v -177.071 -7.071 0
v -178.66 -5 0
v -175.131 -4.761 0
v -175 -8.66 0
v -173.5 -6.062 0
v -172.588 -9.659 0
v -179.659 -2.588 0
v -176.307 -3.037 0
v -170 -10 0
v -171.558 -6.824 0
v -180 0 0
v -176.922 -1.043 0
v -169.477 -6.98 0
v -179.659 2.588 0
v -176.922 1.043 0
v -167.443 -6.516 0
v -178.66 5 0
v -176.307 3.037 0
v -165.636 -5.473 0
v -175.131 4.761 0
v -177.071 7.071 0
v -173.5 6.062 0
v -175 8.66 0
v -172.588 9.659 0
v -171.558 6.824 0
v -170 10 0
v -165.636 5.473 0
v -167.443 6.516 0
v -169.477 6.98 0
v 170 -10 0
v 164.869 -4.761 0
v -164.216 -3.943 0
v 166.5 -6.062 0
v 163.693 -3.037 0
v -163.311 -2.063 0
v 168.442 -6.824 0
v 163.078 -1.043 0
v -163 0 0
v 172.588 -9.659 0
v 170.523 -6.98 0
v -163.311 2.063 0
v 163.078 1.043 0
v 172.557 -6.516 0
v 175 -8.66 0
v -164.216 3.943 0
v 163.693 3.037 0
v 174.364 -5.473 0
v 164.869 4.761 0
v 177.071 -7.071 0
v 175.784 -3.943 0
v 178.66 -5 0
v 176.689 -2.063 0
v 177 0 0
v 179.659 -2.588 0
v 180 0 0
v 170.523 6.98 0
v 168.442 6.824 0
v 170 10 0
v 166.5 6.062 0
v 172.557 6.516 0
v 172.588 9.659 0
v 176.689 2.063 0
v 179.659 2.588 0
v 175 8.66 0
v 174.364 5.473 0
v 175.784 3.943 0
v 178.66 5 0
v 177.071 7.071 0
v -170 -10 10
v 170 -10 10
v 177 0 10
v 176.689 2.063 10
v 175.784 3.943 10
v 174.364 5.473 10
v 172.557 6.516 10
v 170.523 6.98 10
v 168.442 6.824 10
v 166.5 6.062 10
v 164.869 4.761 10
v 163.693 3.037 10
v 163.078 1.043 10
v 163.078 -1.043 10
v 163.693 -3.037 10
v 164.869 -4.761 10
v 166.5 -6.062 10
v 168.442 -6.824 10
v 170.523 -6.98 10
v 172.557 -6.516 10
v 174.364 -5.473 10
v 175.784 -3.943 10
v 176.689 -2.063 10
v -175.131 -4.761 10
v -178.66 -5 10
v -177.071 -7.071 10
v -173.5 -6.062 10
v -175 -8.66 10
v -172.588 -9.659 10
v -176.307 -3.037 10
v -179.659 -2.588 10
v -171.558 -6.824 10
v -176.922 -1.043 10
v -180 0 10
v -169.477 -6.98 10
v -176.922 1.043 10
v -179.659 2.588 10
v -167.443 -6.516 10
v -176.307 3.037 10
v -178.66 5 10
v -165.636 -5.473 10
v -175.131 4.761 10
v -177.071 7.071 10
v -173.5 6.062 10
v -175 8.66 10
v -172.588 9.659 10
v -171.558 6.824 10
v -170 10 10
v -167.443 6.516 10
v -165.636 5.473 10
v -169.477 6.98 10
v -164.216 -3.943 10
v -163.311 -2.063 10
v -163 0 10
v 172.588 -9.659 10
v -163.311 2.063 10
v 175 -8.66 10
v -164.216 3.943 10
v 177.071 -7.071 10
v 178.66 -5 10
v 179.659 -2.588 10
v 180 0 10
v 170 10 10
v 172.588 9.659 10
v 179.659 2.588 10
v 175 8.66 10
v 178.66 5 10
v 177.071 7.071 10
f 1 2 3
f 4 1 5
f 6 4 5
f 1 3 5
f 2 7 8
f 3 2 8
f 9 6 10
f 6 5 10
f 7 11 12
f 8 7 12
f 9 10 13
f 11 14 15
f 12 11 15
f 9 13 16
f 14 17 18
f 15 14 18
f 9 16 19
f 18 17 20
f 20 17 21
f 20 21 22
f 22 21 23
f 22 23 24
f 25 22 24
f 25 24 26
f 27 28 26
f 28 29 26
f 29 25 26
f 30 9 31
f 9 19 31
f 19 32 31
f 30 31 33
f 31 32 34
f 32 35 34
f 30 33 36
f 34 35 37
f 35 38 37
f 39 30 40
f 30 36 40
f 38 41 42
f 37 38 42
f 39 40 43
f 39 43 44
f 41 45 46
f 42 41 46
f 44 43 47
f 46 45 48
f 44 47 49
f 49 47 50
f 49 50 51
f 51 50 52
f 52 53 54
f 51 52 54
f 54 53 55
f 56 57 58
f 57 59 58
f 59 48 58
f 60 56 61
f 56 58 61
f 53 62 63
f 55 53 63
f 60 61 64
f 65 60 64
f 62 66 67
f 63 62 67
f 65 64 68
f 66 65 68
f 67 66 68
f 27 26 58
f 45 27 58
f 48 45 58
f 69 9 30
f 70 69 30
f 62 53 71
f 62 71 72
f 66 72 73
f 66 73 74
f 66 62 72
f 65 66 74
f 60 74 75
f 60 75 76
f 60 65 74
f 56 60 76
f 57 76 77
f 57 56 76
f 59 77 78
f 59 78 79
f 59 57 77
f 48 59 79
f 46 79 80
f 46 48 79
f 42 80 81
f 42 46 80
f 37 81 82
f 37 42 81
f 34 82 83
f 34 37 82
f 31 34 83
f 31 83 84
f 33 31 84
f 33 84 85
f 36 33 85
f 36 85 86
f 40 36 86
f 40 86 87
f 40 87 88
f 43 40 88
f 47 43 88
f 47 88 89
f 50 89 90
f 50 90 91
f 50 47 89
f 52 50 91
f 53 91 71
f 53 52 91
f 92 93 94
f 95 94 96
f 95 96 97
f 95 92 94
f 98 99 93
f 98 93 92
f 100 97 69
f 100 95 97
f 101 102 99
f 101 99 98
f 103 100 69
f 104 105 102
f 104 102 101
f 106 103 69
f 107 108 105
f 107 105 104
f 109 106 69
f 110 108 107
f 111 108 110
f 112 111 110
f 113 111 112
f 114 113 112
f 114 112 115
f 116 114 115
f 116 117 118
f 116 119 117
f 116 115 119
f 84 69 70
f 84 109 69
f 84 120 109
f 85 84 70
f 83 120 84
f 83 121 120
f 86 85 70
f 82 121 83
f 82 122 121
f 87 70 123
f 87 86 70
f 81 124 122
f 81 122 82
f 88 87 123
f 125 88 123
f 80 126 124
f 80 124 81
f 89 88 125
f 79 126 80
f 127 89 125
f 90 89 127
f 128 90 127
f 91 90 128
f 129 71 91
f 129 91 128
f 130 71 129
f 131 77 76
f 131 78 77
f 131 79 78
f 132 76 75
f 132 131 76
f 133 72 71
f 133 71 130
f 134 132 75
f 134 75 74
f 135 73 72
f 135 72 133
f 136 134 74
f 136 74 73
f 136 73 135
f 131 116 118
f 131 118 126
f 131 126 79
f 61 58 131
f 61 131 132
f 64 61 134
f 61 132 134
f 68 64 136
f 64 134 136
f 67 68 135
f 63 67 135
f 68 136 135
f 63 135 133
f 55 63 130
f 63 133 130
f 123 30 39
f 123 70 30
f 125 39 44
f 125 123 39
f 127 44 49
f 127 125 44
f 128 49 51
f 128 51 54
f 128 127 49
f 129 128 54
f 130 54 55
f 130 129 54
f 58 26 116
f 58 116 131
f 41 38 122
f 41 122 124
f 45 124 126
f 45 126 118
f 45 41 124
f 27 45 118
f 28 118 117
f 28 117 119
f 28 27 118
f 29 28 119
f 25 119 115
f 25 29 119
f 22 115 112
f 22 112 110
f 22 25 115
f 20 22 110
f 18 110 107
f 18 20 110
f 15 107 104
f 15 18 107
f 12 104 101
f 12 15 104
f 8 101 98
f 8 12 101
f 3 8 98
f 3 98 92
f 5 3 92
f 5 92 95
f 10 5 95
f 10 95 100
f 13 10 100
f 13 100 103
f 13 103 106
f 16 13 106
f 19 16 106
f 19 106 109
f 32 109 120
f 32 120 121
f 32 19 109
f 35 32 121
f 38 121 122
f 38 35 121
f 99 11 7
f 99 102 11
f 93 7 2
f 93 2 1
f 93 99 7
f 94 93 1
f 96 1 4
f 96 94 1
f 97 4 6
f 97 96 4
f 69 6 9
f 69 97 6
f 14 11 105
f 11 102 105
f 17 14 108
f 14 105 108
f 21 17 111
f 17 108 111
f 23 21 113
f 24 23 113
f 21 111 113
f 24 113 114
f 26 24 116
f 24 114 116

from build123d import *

# Parameters (mm, degrees)
SKETCH_1_W      = 360
SKETCH_1_H      = 20
SKETCH_1_R      = 7
EXTRUDE_1_DEPTH = 10
FILLET_1_R      = 10


with BuildPart() as part:
    # 草图1 → 凸台-拉伸1 (new body)
    with BuildSketch(Plane.XY):
        Rectangle(SKETCH_1_W, SKETCH_1_H)
        with Locations((-170, 0)):
            Circle(SKETCH_1_R, mode=Mode.SUBTRACT)
        with Locations((170, 0)):
            Circle(SKETCH_1_R, mode=Mode.SUBTRACT)
    extrude(amount=EXTRUDE_1_DEPTH)

    # 圆角1
    fillet_1_edges = [part.edges().sort_by_distance(p)[0] for p in [
        (180, 10, 5),
        (180, -10, 5),
        (-180, -10, 5),
        (-180, 10, 5),
    ]]
    fillet(fillet_1_edges, radius=FILLET_1_R - 0.0001)  # a hair under: the kernel refuses the full size


solid = part.part
